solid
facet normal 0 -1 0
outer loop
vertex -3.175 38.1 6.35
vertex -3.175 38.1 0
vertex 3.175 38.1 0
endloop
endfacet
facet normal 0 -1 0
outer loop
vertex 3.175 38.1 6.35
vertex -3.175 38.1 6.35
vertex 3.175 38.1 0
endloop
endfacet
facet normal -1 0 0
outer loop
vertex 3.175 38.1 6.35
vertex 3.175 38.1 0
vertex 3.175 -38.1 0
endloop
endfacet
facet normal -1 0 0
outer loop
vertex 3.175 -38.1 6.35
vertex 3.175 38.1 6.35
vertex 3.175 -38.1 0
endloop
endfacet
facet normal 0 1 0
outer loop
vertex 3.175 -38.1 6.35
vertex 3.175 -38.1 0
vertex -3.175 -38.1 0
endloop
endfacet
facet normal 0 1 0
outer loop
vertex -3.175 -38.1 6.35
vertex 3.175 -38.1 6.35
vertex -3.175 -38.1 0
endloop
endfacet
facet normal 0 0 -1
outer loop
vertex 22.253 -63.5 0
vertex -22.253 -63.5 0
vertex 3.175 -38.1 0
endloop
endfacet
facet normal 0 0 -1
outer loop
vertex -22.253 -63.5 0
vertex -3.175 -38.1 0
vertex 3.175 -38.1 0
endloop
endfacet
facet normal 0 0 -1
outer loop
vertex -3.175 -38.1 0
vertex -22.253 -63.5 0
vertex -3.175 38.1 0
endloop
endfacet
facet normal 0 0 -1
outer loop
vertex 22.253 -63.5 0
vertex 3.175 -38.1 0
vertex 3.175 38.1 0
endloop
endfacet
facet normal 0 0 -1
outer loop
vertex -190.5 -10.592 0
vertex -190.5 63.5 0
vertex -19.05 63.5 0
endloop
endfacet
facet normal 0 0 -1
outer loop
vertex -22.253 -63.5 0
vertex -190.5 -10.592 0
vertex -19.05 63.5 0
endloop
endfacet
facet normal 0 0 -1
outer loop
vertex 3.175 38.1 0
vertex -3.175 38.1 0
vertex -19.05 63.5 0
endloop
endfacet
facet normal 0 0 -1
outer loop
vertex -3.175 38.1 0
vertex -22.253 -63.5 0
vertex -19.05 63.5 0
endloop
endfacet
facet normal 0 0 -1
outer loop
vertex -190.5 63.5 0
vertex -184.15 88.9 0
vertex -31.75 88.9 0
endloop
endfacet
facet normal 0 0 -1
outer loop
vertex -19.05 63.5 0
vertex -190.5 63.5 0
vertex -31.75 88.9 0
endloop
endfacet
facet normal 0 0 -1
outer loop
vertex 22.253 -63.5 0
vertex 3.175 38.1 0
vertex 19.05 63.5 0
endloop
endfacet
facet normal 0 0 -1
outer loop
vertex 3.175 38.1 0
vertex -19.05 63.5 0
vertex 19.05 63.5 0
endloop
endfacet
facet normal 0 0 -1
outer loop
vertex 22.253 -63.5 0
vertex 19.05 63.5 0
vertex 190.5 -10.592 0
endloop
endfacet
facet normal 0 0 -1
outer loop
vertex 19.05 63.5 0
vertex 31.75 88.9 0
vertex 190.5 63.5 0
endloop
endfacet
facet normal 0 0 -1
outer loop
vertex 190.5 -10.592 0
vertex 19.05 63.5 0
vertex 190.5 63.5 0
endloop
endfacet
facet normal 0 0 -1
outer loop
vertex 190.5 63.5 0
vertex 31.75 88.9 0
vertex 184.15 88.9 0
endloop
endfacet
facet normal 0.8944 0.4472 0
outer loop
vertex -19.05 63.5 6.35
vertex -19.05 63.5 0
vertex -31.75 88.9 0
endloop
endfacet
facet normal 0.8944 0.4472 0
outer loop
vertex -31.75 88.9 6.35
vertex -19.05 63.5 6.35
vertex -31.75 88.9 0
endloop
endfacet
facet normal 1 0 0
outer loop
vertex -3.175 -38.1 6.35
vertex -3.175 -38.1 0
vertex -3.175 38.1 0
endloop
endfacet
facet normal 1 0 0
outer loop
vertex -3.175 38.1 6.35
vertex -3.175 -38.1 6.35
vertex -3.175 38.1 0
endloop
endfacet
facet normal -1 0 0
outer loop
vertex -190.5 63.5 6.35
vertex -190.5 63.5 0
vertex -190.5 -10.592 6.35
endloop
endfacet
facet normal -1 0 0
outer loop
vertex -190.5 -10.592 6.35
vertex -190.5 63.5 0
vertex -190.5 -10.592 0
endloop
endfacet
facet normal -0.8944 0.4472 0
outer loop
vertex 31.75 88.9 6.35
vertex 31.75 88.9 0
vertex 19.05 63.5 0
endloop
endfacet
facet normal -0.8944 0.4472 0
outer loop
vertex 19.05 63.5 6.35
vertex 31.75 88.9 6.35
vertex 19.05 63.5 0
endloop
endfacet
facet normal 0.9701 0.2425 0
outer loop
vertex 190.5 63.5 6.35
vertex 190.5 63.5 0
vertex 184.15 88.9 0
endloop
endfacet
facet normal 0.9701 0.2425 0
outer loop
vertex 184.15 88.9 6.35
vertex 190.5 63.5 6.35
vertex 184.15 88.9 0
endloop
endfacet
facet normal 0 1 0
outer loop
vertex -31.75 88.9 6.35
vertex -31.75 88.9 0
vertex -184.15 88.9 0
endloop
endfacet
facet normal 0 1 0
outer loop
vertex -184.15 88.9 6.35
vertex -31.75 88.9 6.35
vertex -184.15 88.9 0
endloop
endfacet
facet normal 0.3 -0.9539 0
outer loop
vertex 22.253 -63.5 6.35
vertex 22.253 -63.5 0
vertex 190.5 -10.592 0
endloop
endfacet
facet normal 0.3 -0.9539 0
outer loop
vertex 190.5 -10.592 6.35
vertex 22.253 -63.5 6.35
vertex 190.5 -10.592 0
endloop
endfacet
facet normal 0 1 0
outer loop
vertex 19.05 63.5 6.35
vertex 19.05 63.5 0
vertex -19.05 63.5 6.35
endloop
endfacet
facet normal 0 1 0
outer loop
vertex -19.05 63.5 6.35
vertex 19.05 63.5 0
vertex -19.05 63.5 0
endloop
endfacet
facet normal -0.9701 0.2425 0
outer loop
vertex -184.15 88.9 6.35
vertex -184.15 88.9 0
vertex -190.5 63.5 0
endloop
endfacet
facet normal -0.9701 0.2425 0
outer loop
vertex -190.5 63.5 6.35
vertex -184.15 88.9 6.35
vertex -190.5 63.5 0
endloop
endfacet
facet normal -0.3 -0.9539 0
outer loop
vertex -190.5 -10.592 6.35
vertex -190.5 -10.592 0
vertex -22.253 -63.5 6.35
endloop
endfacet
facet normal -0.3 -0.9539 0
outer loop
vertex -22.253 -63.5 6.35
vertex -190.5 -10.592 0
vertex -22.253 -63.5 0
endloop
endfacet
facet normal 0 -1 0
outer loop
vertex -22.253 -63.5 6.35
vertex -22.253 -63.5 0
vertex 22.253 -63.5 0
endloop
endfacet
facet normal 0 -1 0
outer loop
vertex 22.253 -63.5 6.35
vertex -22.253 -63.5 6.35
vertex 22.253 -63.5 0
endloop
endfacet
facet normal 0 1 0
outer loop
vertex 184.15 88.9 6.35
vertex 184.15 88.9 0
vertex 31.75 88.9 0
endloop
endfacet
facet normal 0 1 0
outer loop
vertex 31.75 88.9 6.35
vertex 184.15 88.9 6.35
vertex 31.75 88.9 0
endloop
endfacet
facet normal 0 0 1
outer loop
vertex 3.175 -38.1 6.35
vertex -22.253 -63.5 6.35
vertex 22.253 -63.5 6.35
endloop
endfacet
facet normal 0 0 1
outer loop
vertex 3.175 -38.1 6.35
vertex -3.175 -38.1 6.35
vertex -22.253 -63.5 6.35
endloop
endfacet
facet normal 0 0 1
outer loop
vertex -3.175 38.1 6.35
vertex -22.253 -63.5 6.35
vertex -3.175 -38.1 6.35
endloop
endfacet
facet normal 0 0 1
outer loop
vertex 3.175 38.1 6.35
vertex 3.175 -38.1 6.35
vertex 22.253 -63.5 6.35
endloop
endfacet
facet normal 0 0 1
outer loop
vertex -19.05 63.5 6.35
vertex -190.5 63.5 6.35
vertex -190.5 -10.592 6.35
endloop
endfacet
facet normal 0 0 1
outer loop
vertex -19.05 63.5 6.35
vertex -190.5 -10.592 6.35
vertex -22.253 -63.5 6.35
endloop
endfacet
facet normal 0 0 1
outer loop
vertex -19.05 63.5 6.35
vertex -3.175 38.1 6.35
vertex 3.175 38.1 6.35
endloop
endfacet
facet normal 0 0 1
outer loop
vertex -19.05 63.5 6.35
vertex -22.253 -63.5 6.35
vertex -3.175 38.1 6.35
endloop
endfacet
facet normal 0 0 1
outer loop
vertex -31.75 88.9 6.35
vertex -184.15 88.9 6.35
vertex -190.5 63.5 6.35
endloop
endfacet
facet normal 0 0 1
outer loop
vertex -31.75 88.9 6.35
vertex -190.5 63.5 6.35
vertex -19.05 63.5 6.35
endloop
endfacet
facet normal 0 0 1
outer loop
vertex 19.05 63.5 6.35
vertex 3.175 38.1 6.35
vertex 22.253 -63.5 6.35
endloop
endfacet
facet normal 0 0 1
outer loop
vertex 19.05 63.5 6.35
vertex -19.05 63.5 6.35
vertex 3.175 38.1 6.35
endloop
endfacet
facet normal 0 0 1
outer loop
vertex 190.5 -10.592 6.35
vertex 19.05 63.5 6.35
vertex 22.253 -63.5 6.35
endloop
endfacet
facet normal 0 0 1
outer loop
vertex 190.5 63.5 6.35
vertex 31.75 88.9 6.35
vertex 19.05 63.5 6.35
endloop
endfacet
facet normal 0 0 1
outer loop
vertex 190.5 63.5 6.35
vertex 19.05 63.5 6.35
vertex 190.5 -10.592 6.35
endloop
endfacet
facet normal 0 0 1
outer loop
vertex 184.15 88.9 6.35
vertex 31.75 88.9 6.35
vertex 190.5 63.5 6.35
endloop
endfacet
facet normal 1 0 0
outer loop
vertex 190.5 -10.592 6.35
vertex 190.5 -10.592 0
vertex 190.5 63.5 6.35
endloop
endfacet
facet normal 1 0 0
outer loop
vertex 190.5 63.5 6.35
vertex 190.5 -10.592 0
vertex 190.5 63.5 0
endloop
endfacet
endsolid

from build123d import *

# Parameters (mm, degrees)
F1_DEPTH = 6.35


with BuildPart() as f1:
    # F0 (on Top) → F1 (new body)
    with BuildSketch(Plane.XY):
        Polygon((-190.5, 63.5), (-190.5, -10.592123), (-22.25318, -63.5), (0, -63.5), (22.25318, -63.5), (190.5, -10.592123), (190.5, 63.5), (19.05, 63.5), (0, 63.5), (-19.05, 63.5), align=None)
        Polygon((3.175, -38.1), (0, -38.1), (-3.175, -38.1), (-3.175, 38.1), (0, 38.1), (3.175, 38.1), align=None, mode=Mode.SUBTRACT)
        Polygon((-184.15, 88.9), (-190.5, 63.5), (-19.05, 63.5), (-31.75, 88.9), align=None)
        Polygon((31.75, 88.9), (19.05, 63.5), (190.5, 63.5), (184.15, 88.9), align=None)
    extrude(amount=F1_DEPTH)


solid = f1.part
